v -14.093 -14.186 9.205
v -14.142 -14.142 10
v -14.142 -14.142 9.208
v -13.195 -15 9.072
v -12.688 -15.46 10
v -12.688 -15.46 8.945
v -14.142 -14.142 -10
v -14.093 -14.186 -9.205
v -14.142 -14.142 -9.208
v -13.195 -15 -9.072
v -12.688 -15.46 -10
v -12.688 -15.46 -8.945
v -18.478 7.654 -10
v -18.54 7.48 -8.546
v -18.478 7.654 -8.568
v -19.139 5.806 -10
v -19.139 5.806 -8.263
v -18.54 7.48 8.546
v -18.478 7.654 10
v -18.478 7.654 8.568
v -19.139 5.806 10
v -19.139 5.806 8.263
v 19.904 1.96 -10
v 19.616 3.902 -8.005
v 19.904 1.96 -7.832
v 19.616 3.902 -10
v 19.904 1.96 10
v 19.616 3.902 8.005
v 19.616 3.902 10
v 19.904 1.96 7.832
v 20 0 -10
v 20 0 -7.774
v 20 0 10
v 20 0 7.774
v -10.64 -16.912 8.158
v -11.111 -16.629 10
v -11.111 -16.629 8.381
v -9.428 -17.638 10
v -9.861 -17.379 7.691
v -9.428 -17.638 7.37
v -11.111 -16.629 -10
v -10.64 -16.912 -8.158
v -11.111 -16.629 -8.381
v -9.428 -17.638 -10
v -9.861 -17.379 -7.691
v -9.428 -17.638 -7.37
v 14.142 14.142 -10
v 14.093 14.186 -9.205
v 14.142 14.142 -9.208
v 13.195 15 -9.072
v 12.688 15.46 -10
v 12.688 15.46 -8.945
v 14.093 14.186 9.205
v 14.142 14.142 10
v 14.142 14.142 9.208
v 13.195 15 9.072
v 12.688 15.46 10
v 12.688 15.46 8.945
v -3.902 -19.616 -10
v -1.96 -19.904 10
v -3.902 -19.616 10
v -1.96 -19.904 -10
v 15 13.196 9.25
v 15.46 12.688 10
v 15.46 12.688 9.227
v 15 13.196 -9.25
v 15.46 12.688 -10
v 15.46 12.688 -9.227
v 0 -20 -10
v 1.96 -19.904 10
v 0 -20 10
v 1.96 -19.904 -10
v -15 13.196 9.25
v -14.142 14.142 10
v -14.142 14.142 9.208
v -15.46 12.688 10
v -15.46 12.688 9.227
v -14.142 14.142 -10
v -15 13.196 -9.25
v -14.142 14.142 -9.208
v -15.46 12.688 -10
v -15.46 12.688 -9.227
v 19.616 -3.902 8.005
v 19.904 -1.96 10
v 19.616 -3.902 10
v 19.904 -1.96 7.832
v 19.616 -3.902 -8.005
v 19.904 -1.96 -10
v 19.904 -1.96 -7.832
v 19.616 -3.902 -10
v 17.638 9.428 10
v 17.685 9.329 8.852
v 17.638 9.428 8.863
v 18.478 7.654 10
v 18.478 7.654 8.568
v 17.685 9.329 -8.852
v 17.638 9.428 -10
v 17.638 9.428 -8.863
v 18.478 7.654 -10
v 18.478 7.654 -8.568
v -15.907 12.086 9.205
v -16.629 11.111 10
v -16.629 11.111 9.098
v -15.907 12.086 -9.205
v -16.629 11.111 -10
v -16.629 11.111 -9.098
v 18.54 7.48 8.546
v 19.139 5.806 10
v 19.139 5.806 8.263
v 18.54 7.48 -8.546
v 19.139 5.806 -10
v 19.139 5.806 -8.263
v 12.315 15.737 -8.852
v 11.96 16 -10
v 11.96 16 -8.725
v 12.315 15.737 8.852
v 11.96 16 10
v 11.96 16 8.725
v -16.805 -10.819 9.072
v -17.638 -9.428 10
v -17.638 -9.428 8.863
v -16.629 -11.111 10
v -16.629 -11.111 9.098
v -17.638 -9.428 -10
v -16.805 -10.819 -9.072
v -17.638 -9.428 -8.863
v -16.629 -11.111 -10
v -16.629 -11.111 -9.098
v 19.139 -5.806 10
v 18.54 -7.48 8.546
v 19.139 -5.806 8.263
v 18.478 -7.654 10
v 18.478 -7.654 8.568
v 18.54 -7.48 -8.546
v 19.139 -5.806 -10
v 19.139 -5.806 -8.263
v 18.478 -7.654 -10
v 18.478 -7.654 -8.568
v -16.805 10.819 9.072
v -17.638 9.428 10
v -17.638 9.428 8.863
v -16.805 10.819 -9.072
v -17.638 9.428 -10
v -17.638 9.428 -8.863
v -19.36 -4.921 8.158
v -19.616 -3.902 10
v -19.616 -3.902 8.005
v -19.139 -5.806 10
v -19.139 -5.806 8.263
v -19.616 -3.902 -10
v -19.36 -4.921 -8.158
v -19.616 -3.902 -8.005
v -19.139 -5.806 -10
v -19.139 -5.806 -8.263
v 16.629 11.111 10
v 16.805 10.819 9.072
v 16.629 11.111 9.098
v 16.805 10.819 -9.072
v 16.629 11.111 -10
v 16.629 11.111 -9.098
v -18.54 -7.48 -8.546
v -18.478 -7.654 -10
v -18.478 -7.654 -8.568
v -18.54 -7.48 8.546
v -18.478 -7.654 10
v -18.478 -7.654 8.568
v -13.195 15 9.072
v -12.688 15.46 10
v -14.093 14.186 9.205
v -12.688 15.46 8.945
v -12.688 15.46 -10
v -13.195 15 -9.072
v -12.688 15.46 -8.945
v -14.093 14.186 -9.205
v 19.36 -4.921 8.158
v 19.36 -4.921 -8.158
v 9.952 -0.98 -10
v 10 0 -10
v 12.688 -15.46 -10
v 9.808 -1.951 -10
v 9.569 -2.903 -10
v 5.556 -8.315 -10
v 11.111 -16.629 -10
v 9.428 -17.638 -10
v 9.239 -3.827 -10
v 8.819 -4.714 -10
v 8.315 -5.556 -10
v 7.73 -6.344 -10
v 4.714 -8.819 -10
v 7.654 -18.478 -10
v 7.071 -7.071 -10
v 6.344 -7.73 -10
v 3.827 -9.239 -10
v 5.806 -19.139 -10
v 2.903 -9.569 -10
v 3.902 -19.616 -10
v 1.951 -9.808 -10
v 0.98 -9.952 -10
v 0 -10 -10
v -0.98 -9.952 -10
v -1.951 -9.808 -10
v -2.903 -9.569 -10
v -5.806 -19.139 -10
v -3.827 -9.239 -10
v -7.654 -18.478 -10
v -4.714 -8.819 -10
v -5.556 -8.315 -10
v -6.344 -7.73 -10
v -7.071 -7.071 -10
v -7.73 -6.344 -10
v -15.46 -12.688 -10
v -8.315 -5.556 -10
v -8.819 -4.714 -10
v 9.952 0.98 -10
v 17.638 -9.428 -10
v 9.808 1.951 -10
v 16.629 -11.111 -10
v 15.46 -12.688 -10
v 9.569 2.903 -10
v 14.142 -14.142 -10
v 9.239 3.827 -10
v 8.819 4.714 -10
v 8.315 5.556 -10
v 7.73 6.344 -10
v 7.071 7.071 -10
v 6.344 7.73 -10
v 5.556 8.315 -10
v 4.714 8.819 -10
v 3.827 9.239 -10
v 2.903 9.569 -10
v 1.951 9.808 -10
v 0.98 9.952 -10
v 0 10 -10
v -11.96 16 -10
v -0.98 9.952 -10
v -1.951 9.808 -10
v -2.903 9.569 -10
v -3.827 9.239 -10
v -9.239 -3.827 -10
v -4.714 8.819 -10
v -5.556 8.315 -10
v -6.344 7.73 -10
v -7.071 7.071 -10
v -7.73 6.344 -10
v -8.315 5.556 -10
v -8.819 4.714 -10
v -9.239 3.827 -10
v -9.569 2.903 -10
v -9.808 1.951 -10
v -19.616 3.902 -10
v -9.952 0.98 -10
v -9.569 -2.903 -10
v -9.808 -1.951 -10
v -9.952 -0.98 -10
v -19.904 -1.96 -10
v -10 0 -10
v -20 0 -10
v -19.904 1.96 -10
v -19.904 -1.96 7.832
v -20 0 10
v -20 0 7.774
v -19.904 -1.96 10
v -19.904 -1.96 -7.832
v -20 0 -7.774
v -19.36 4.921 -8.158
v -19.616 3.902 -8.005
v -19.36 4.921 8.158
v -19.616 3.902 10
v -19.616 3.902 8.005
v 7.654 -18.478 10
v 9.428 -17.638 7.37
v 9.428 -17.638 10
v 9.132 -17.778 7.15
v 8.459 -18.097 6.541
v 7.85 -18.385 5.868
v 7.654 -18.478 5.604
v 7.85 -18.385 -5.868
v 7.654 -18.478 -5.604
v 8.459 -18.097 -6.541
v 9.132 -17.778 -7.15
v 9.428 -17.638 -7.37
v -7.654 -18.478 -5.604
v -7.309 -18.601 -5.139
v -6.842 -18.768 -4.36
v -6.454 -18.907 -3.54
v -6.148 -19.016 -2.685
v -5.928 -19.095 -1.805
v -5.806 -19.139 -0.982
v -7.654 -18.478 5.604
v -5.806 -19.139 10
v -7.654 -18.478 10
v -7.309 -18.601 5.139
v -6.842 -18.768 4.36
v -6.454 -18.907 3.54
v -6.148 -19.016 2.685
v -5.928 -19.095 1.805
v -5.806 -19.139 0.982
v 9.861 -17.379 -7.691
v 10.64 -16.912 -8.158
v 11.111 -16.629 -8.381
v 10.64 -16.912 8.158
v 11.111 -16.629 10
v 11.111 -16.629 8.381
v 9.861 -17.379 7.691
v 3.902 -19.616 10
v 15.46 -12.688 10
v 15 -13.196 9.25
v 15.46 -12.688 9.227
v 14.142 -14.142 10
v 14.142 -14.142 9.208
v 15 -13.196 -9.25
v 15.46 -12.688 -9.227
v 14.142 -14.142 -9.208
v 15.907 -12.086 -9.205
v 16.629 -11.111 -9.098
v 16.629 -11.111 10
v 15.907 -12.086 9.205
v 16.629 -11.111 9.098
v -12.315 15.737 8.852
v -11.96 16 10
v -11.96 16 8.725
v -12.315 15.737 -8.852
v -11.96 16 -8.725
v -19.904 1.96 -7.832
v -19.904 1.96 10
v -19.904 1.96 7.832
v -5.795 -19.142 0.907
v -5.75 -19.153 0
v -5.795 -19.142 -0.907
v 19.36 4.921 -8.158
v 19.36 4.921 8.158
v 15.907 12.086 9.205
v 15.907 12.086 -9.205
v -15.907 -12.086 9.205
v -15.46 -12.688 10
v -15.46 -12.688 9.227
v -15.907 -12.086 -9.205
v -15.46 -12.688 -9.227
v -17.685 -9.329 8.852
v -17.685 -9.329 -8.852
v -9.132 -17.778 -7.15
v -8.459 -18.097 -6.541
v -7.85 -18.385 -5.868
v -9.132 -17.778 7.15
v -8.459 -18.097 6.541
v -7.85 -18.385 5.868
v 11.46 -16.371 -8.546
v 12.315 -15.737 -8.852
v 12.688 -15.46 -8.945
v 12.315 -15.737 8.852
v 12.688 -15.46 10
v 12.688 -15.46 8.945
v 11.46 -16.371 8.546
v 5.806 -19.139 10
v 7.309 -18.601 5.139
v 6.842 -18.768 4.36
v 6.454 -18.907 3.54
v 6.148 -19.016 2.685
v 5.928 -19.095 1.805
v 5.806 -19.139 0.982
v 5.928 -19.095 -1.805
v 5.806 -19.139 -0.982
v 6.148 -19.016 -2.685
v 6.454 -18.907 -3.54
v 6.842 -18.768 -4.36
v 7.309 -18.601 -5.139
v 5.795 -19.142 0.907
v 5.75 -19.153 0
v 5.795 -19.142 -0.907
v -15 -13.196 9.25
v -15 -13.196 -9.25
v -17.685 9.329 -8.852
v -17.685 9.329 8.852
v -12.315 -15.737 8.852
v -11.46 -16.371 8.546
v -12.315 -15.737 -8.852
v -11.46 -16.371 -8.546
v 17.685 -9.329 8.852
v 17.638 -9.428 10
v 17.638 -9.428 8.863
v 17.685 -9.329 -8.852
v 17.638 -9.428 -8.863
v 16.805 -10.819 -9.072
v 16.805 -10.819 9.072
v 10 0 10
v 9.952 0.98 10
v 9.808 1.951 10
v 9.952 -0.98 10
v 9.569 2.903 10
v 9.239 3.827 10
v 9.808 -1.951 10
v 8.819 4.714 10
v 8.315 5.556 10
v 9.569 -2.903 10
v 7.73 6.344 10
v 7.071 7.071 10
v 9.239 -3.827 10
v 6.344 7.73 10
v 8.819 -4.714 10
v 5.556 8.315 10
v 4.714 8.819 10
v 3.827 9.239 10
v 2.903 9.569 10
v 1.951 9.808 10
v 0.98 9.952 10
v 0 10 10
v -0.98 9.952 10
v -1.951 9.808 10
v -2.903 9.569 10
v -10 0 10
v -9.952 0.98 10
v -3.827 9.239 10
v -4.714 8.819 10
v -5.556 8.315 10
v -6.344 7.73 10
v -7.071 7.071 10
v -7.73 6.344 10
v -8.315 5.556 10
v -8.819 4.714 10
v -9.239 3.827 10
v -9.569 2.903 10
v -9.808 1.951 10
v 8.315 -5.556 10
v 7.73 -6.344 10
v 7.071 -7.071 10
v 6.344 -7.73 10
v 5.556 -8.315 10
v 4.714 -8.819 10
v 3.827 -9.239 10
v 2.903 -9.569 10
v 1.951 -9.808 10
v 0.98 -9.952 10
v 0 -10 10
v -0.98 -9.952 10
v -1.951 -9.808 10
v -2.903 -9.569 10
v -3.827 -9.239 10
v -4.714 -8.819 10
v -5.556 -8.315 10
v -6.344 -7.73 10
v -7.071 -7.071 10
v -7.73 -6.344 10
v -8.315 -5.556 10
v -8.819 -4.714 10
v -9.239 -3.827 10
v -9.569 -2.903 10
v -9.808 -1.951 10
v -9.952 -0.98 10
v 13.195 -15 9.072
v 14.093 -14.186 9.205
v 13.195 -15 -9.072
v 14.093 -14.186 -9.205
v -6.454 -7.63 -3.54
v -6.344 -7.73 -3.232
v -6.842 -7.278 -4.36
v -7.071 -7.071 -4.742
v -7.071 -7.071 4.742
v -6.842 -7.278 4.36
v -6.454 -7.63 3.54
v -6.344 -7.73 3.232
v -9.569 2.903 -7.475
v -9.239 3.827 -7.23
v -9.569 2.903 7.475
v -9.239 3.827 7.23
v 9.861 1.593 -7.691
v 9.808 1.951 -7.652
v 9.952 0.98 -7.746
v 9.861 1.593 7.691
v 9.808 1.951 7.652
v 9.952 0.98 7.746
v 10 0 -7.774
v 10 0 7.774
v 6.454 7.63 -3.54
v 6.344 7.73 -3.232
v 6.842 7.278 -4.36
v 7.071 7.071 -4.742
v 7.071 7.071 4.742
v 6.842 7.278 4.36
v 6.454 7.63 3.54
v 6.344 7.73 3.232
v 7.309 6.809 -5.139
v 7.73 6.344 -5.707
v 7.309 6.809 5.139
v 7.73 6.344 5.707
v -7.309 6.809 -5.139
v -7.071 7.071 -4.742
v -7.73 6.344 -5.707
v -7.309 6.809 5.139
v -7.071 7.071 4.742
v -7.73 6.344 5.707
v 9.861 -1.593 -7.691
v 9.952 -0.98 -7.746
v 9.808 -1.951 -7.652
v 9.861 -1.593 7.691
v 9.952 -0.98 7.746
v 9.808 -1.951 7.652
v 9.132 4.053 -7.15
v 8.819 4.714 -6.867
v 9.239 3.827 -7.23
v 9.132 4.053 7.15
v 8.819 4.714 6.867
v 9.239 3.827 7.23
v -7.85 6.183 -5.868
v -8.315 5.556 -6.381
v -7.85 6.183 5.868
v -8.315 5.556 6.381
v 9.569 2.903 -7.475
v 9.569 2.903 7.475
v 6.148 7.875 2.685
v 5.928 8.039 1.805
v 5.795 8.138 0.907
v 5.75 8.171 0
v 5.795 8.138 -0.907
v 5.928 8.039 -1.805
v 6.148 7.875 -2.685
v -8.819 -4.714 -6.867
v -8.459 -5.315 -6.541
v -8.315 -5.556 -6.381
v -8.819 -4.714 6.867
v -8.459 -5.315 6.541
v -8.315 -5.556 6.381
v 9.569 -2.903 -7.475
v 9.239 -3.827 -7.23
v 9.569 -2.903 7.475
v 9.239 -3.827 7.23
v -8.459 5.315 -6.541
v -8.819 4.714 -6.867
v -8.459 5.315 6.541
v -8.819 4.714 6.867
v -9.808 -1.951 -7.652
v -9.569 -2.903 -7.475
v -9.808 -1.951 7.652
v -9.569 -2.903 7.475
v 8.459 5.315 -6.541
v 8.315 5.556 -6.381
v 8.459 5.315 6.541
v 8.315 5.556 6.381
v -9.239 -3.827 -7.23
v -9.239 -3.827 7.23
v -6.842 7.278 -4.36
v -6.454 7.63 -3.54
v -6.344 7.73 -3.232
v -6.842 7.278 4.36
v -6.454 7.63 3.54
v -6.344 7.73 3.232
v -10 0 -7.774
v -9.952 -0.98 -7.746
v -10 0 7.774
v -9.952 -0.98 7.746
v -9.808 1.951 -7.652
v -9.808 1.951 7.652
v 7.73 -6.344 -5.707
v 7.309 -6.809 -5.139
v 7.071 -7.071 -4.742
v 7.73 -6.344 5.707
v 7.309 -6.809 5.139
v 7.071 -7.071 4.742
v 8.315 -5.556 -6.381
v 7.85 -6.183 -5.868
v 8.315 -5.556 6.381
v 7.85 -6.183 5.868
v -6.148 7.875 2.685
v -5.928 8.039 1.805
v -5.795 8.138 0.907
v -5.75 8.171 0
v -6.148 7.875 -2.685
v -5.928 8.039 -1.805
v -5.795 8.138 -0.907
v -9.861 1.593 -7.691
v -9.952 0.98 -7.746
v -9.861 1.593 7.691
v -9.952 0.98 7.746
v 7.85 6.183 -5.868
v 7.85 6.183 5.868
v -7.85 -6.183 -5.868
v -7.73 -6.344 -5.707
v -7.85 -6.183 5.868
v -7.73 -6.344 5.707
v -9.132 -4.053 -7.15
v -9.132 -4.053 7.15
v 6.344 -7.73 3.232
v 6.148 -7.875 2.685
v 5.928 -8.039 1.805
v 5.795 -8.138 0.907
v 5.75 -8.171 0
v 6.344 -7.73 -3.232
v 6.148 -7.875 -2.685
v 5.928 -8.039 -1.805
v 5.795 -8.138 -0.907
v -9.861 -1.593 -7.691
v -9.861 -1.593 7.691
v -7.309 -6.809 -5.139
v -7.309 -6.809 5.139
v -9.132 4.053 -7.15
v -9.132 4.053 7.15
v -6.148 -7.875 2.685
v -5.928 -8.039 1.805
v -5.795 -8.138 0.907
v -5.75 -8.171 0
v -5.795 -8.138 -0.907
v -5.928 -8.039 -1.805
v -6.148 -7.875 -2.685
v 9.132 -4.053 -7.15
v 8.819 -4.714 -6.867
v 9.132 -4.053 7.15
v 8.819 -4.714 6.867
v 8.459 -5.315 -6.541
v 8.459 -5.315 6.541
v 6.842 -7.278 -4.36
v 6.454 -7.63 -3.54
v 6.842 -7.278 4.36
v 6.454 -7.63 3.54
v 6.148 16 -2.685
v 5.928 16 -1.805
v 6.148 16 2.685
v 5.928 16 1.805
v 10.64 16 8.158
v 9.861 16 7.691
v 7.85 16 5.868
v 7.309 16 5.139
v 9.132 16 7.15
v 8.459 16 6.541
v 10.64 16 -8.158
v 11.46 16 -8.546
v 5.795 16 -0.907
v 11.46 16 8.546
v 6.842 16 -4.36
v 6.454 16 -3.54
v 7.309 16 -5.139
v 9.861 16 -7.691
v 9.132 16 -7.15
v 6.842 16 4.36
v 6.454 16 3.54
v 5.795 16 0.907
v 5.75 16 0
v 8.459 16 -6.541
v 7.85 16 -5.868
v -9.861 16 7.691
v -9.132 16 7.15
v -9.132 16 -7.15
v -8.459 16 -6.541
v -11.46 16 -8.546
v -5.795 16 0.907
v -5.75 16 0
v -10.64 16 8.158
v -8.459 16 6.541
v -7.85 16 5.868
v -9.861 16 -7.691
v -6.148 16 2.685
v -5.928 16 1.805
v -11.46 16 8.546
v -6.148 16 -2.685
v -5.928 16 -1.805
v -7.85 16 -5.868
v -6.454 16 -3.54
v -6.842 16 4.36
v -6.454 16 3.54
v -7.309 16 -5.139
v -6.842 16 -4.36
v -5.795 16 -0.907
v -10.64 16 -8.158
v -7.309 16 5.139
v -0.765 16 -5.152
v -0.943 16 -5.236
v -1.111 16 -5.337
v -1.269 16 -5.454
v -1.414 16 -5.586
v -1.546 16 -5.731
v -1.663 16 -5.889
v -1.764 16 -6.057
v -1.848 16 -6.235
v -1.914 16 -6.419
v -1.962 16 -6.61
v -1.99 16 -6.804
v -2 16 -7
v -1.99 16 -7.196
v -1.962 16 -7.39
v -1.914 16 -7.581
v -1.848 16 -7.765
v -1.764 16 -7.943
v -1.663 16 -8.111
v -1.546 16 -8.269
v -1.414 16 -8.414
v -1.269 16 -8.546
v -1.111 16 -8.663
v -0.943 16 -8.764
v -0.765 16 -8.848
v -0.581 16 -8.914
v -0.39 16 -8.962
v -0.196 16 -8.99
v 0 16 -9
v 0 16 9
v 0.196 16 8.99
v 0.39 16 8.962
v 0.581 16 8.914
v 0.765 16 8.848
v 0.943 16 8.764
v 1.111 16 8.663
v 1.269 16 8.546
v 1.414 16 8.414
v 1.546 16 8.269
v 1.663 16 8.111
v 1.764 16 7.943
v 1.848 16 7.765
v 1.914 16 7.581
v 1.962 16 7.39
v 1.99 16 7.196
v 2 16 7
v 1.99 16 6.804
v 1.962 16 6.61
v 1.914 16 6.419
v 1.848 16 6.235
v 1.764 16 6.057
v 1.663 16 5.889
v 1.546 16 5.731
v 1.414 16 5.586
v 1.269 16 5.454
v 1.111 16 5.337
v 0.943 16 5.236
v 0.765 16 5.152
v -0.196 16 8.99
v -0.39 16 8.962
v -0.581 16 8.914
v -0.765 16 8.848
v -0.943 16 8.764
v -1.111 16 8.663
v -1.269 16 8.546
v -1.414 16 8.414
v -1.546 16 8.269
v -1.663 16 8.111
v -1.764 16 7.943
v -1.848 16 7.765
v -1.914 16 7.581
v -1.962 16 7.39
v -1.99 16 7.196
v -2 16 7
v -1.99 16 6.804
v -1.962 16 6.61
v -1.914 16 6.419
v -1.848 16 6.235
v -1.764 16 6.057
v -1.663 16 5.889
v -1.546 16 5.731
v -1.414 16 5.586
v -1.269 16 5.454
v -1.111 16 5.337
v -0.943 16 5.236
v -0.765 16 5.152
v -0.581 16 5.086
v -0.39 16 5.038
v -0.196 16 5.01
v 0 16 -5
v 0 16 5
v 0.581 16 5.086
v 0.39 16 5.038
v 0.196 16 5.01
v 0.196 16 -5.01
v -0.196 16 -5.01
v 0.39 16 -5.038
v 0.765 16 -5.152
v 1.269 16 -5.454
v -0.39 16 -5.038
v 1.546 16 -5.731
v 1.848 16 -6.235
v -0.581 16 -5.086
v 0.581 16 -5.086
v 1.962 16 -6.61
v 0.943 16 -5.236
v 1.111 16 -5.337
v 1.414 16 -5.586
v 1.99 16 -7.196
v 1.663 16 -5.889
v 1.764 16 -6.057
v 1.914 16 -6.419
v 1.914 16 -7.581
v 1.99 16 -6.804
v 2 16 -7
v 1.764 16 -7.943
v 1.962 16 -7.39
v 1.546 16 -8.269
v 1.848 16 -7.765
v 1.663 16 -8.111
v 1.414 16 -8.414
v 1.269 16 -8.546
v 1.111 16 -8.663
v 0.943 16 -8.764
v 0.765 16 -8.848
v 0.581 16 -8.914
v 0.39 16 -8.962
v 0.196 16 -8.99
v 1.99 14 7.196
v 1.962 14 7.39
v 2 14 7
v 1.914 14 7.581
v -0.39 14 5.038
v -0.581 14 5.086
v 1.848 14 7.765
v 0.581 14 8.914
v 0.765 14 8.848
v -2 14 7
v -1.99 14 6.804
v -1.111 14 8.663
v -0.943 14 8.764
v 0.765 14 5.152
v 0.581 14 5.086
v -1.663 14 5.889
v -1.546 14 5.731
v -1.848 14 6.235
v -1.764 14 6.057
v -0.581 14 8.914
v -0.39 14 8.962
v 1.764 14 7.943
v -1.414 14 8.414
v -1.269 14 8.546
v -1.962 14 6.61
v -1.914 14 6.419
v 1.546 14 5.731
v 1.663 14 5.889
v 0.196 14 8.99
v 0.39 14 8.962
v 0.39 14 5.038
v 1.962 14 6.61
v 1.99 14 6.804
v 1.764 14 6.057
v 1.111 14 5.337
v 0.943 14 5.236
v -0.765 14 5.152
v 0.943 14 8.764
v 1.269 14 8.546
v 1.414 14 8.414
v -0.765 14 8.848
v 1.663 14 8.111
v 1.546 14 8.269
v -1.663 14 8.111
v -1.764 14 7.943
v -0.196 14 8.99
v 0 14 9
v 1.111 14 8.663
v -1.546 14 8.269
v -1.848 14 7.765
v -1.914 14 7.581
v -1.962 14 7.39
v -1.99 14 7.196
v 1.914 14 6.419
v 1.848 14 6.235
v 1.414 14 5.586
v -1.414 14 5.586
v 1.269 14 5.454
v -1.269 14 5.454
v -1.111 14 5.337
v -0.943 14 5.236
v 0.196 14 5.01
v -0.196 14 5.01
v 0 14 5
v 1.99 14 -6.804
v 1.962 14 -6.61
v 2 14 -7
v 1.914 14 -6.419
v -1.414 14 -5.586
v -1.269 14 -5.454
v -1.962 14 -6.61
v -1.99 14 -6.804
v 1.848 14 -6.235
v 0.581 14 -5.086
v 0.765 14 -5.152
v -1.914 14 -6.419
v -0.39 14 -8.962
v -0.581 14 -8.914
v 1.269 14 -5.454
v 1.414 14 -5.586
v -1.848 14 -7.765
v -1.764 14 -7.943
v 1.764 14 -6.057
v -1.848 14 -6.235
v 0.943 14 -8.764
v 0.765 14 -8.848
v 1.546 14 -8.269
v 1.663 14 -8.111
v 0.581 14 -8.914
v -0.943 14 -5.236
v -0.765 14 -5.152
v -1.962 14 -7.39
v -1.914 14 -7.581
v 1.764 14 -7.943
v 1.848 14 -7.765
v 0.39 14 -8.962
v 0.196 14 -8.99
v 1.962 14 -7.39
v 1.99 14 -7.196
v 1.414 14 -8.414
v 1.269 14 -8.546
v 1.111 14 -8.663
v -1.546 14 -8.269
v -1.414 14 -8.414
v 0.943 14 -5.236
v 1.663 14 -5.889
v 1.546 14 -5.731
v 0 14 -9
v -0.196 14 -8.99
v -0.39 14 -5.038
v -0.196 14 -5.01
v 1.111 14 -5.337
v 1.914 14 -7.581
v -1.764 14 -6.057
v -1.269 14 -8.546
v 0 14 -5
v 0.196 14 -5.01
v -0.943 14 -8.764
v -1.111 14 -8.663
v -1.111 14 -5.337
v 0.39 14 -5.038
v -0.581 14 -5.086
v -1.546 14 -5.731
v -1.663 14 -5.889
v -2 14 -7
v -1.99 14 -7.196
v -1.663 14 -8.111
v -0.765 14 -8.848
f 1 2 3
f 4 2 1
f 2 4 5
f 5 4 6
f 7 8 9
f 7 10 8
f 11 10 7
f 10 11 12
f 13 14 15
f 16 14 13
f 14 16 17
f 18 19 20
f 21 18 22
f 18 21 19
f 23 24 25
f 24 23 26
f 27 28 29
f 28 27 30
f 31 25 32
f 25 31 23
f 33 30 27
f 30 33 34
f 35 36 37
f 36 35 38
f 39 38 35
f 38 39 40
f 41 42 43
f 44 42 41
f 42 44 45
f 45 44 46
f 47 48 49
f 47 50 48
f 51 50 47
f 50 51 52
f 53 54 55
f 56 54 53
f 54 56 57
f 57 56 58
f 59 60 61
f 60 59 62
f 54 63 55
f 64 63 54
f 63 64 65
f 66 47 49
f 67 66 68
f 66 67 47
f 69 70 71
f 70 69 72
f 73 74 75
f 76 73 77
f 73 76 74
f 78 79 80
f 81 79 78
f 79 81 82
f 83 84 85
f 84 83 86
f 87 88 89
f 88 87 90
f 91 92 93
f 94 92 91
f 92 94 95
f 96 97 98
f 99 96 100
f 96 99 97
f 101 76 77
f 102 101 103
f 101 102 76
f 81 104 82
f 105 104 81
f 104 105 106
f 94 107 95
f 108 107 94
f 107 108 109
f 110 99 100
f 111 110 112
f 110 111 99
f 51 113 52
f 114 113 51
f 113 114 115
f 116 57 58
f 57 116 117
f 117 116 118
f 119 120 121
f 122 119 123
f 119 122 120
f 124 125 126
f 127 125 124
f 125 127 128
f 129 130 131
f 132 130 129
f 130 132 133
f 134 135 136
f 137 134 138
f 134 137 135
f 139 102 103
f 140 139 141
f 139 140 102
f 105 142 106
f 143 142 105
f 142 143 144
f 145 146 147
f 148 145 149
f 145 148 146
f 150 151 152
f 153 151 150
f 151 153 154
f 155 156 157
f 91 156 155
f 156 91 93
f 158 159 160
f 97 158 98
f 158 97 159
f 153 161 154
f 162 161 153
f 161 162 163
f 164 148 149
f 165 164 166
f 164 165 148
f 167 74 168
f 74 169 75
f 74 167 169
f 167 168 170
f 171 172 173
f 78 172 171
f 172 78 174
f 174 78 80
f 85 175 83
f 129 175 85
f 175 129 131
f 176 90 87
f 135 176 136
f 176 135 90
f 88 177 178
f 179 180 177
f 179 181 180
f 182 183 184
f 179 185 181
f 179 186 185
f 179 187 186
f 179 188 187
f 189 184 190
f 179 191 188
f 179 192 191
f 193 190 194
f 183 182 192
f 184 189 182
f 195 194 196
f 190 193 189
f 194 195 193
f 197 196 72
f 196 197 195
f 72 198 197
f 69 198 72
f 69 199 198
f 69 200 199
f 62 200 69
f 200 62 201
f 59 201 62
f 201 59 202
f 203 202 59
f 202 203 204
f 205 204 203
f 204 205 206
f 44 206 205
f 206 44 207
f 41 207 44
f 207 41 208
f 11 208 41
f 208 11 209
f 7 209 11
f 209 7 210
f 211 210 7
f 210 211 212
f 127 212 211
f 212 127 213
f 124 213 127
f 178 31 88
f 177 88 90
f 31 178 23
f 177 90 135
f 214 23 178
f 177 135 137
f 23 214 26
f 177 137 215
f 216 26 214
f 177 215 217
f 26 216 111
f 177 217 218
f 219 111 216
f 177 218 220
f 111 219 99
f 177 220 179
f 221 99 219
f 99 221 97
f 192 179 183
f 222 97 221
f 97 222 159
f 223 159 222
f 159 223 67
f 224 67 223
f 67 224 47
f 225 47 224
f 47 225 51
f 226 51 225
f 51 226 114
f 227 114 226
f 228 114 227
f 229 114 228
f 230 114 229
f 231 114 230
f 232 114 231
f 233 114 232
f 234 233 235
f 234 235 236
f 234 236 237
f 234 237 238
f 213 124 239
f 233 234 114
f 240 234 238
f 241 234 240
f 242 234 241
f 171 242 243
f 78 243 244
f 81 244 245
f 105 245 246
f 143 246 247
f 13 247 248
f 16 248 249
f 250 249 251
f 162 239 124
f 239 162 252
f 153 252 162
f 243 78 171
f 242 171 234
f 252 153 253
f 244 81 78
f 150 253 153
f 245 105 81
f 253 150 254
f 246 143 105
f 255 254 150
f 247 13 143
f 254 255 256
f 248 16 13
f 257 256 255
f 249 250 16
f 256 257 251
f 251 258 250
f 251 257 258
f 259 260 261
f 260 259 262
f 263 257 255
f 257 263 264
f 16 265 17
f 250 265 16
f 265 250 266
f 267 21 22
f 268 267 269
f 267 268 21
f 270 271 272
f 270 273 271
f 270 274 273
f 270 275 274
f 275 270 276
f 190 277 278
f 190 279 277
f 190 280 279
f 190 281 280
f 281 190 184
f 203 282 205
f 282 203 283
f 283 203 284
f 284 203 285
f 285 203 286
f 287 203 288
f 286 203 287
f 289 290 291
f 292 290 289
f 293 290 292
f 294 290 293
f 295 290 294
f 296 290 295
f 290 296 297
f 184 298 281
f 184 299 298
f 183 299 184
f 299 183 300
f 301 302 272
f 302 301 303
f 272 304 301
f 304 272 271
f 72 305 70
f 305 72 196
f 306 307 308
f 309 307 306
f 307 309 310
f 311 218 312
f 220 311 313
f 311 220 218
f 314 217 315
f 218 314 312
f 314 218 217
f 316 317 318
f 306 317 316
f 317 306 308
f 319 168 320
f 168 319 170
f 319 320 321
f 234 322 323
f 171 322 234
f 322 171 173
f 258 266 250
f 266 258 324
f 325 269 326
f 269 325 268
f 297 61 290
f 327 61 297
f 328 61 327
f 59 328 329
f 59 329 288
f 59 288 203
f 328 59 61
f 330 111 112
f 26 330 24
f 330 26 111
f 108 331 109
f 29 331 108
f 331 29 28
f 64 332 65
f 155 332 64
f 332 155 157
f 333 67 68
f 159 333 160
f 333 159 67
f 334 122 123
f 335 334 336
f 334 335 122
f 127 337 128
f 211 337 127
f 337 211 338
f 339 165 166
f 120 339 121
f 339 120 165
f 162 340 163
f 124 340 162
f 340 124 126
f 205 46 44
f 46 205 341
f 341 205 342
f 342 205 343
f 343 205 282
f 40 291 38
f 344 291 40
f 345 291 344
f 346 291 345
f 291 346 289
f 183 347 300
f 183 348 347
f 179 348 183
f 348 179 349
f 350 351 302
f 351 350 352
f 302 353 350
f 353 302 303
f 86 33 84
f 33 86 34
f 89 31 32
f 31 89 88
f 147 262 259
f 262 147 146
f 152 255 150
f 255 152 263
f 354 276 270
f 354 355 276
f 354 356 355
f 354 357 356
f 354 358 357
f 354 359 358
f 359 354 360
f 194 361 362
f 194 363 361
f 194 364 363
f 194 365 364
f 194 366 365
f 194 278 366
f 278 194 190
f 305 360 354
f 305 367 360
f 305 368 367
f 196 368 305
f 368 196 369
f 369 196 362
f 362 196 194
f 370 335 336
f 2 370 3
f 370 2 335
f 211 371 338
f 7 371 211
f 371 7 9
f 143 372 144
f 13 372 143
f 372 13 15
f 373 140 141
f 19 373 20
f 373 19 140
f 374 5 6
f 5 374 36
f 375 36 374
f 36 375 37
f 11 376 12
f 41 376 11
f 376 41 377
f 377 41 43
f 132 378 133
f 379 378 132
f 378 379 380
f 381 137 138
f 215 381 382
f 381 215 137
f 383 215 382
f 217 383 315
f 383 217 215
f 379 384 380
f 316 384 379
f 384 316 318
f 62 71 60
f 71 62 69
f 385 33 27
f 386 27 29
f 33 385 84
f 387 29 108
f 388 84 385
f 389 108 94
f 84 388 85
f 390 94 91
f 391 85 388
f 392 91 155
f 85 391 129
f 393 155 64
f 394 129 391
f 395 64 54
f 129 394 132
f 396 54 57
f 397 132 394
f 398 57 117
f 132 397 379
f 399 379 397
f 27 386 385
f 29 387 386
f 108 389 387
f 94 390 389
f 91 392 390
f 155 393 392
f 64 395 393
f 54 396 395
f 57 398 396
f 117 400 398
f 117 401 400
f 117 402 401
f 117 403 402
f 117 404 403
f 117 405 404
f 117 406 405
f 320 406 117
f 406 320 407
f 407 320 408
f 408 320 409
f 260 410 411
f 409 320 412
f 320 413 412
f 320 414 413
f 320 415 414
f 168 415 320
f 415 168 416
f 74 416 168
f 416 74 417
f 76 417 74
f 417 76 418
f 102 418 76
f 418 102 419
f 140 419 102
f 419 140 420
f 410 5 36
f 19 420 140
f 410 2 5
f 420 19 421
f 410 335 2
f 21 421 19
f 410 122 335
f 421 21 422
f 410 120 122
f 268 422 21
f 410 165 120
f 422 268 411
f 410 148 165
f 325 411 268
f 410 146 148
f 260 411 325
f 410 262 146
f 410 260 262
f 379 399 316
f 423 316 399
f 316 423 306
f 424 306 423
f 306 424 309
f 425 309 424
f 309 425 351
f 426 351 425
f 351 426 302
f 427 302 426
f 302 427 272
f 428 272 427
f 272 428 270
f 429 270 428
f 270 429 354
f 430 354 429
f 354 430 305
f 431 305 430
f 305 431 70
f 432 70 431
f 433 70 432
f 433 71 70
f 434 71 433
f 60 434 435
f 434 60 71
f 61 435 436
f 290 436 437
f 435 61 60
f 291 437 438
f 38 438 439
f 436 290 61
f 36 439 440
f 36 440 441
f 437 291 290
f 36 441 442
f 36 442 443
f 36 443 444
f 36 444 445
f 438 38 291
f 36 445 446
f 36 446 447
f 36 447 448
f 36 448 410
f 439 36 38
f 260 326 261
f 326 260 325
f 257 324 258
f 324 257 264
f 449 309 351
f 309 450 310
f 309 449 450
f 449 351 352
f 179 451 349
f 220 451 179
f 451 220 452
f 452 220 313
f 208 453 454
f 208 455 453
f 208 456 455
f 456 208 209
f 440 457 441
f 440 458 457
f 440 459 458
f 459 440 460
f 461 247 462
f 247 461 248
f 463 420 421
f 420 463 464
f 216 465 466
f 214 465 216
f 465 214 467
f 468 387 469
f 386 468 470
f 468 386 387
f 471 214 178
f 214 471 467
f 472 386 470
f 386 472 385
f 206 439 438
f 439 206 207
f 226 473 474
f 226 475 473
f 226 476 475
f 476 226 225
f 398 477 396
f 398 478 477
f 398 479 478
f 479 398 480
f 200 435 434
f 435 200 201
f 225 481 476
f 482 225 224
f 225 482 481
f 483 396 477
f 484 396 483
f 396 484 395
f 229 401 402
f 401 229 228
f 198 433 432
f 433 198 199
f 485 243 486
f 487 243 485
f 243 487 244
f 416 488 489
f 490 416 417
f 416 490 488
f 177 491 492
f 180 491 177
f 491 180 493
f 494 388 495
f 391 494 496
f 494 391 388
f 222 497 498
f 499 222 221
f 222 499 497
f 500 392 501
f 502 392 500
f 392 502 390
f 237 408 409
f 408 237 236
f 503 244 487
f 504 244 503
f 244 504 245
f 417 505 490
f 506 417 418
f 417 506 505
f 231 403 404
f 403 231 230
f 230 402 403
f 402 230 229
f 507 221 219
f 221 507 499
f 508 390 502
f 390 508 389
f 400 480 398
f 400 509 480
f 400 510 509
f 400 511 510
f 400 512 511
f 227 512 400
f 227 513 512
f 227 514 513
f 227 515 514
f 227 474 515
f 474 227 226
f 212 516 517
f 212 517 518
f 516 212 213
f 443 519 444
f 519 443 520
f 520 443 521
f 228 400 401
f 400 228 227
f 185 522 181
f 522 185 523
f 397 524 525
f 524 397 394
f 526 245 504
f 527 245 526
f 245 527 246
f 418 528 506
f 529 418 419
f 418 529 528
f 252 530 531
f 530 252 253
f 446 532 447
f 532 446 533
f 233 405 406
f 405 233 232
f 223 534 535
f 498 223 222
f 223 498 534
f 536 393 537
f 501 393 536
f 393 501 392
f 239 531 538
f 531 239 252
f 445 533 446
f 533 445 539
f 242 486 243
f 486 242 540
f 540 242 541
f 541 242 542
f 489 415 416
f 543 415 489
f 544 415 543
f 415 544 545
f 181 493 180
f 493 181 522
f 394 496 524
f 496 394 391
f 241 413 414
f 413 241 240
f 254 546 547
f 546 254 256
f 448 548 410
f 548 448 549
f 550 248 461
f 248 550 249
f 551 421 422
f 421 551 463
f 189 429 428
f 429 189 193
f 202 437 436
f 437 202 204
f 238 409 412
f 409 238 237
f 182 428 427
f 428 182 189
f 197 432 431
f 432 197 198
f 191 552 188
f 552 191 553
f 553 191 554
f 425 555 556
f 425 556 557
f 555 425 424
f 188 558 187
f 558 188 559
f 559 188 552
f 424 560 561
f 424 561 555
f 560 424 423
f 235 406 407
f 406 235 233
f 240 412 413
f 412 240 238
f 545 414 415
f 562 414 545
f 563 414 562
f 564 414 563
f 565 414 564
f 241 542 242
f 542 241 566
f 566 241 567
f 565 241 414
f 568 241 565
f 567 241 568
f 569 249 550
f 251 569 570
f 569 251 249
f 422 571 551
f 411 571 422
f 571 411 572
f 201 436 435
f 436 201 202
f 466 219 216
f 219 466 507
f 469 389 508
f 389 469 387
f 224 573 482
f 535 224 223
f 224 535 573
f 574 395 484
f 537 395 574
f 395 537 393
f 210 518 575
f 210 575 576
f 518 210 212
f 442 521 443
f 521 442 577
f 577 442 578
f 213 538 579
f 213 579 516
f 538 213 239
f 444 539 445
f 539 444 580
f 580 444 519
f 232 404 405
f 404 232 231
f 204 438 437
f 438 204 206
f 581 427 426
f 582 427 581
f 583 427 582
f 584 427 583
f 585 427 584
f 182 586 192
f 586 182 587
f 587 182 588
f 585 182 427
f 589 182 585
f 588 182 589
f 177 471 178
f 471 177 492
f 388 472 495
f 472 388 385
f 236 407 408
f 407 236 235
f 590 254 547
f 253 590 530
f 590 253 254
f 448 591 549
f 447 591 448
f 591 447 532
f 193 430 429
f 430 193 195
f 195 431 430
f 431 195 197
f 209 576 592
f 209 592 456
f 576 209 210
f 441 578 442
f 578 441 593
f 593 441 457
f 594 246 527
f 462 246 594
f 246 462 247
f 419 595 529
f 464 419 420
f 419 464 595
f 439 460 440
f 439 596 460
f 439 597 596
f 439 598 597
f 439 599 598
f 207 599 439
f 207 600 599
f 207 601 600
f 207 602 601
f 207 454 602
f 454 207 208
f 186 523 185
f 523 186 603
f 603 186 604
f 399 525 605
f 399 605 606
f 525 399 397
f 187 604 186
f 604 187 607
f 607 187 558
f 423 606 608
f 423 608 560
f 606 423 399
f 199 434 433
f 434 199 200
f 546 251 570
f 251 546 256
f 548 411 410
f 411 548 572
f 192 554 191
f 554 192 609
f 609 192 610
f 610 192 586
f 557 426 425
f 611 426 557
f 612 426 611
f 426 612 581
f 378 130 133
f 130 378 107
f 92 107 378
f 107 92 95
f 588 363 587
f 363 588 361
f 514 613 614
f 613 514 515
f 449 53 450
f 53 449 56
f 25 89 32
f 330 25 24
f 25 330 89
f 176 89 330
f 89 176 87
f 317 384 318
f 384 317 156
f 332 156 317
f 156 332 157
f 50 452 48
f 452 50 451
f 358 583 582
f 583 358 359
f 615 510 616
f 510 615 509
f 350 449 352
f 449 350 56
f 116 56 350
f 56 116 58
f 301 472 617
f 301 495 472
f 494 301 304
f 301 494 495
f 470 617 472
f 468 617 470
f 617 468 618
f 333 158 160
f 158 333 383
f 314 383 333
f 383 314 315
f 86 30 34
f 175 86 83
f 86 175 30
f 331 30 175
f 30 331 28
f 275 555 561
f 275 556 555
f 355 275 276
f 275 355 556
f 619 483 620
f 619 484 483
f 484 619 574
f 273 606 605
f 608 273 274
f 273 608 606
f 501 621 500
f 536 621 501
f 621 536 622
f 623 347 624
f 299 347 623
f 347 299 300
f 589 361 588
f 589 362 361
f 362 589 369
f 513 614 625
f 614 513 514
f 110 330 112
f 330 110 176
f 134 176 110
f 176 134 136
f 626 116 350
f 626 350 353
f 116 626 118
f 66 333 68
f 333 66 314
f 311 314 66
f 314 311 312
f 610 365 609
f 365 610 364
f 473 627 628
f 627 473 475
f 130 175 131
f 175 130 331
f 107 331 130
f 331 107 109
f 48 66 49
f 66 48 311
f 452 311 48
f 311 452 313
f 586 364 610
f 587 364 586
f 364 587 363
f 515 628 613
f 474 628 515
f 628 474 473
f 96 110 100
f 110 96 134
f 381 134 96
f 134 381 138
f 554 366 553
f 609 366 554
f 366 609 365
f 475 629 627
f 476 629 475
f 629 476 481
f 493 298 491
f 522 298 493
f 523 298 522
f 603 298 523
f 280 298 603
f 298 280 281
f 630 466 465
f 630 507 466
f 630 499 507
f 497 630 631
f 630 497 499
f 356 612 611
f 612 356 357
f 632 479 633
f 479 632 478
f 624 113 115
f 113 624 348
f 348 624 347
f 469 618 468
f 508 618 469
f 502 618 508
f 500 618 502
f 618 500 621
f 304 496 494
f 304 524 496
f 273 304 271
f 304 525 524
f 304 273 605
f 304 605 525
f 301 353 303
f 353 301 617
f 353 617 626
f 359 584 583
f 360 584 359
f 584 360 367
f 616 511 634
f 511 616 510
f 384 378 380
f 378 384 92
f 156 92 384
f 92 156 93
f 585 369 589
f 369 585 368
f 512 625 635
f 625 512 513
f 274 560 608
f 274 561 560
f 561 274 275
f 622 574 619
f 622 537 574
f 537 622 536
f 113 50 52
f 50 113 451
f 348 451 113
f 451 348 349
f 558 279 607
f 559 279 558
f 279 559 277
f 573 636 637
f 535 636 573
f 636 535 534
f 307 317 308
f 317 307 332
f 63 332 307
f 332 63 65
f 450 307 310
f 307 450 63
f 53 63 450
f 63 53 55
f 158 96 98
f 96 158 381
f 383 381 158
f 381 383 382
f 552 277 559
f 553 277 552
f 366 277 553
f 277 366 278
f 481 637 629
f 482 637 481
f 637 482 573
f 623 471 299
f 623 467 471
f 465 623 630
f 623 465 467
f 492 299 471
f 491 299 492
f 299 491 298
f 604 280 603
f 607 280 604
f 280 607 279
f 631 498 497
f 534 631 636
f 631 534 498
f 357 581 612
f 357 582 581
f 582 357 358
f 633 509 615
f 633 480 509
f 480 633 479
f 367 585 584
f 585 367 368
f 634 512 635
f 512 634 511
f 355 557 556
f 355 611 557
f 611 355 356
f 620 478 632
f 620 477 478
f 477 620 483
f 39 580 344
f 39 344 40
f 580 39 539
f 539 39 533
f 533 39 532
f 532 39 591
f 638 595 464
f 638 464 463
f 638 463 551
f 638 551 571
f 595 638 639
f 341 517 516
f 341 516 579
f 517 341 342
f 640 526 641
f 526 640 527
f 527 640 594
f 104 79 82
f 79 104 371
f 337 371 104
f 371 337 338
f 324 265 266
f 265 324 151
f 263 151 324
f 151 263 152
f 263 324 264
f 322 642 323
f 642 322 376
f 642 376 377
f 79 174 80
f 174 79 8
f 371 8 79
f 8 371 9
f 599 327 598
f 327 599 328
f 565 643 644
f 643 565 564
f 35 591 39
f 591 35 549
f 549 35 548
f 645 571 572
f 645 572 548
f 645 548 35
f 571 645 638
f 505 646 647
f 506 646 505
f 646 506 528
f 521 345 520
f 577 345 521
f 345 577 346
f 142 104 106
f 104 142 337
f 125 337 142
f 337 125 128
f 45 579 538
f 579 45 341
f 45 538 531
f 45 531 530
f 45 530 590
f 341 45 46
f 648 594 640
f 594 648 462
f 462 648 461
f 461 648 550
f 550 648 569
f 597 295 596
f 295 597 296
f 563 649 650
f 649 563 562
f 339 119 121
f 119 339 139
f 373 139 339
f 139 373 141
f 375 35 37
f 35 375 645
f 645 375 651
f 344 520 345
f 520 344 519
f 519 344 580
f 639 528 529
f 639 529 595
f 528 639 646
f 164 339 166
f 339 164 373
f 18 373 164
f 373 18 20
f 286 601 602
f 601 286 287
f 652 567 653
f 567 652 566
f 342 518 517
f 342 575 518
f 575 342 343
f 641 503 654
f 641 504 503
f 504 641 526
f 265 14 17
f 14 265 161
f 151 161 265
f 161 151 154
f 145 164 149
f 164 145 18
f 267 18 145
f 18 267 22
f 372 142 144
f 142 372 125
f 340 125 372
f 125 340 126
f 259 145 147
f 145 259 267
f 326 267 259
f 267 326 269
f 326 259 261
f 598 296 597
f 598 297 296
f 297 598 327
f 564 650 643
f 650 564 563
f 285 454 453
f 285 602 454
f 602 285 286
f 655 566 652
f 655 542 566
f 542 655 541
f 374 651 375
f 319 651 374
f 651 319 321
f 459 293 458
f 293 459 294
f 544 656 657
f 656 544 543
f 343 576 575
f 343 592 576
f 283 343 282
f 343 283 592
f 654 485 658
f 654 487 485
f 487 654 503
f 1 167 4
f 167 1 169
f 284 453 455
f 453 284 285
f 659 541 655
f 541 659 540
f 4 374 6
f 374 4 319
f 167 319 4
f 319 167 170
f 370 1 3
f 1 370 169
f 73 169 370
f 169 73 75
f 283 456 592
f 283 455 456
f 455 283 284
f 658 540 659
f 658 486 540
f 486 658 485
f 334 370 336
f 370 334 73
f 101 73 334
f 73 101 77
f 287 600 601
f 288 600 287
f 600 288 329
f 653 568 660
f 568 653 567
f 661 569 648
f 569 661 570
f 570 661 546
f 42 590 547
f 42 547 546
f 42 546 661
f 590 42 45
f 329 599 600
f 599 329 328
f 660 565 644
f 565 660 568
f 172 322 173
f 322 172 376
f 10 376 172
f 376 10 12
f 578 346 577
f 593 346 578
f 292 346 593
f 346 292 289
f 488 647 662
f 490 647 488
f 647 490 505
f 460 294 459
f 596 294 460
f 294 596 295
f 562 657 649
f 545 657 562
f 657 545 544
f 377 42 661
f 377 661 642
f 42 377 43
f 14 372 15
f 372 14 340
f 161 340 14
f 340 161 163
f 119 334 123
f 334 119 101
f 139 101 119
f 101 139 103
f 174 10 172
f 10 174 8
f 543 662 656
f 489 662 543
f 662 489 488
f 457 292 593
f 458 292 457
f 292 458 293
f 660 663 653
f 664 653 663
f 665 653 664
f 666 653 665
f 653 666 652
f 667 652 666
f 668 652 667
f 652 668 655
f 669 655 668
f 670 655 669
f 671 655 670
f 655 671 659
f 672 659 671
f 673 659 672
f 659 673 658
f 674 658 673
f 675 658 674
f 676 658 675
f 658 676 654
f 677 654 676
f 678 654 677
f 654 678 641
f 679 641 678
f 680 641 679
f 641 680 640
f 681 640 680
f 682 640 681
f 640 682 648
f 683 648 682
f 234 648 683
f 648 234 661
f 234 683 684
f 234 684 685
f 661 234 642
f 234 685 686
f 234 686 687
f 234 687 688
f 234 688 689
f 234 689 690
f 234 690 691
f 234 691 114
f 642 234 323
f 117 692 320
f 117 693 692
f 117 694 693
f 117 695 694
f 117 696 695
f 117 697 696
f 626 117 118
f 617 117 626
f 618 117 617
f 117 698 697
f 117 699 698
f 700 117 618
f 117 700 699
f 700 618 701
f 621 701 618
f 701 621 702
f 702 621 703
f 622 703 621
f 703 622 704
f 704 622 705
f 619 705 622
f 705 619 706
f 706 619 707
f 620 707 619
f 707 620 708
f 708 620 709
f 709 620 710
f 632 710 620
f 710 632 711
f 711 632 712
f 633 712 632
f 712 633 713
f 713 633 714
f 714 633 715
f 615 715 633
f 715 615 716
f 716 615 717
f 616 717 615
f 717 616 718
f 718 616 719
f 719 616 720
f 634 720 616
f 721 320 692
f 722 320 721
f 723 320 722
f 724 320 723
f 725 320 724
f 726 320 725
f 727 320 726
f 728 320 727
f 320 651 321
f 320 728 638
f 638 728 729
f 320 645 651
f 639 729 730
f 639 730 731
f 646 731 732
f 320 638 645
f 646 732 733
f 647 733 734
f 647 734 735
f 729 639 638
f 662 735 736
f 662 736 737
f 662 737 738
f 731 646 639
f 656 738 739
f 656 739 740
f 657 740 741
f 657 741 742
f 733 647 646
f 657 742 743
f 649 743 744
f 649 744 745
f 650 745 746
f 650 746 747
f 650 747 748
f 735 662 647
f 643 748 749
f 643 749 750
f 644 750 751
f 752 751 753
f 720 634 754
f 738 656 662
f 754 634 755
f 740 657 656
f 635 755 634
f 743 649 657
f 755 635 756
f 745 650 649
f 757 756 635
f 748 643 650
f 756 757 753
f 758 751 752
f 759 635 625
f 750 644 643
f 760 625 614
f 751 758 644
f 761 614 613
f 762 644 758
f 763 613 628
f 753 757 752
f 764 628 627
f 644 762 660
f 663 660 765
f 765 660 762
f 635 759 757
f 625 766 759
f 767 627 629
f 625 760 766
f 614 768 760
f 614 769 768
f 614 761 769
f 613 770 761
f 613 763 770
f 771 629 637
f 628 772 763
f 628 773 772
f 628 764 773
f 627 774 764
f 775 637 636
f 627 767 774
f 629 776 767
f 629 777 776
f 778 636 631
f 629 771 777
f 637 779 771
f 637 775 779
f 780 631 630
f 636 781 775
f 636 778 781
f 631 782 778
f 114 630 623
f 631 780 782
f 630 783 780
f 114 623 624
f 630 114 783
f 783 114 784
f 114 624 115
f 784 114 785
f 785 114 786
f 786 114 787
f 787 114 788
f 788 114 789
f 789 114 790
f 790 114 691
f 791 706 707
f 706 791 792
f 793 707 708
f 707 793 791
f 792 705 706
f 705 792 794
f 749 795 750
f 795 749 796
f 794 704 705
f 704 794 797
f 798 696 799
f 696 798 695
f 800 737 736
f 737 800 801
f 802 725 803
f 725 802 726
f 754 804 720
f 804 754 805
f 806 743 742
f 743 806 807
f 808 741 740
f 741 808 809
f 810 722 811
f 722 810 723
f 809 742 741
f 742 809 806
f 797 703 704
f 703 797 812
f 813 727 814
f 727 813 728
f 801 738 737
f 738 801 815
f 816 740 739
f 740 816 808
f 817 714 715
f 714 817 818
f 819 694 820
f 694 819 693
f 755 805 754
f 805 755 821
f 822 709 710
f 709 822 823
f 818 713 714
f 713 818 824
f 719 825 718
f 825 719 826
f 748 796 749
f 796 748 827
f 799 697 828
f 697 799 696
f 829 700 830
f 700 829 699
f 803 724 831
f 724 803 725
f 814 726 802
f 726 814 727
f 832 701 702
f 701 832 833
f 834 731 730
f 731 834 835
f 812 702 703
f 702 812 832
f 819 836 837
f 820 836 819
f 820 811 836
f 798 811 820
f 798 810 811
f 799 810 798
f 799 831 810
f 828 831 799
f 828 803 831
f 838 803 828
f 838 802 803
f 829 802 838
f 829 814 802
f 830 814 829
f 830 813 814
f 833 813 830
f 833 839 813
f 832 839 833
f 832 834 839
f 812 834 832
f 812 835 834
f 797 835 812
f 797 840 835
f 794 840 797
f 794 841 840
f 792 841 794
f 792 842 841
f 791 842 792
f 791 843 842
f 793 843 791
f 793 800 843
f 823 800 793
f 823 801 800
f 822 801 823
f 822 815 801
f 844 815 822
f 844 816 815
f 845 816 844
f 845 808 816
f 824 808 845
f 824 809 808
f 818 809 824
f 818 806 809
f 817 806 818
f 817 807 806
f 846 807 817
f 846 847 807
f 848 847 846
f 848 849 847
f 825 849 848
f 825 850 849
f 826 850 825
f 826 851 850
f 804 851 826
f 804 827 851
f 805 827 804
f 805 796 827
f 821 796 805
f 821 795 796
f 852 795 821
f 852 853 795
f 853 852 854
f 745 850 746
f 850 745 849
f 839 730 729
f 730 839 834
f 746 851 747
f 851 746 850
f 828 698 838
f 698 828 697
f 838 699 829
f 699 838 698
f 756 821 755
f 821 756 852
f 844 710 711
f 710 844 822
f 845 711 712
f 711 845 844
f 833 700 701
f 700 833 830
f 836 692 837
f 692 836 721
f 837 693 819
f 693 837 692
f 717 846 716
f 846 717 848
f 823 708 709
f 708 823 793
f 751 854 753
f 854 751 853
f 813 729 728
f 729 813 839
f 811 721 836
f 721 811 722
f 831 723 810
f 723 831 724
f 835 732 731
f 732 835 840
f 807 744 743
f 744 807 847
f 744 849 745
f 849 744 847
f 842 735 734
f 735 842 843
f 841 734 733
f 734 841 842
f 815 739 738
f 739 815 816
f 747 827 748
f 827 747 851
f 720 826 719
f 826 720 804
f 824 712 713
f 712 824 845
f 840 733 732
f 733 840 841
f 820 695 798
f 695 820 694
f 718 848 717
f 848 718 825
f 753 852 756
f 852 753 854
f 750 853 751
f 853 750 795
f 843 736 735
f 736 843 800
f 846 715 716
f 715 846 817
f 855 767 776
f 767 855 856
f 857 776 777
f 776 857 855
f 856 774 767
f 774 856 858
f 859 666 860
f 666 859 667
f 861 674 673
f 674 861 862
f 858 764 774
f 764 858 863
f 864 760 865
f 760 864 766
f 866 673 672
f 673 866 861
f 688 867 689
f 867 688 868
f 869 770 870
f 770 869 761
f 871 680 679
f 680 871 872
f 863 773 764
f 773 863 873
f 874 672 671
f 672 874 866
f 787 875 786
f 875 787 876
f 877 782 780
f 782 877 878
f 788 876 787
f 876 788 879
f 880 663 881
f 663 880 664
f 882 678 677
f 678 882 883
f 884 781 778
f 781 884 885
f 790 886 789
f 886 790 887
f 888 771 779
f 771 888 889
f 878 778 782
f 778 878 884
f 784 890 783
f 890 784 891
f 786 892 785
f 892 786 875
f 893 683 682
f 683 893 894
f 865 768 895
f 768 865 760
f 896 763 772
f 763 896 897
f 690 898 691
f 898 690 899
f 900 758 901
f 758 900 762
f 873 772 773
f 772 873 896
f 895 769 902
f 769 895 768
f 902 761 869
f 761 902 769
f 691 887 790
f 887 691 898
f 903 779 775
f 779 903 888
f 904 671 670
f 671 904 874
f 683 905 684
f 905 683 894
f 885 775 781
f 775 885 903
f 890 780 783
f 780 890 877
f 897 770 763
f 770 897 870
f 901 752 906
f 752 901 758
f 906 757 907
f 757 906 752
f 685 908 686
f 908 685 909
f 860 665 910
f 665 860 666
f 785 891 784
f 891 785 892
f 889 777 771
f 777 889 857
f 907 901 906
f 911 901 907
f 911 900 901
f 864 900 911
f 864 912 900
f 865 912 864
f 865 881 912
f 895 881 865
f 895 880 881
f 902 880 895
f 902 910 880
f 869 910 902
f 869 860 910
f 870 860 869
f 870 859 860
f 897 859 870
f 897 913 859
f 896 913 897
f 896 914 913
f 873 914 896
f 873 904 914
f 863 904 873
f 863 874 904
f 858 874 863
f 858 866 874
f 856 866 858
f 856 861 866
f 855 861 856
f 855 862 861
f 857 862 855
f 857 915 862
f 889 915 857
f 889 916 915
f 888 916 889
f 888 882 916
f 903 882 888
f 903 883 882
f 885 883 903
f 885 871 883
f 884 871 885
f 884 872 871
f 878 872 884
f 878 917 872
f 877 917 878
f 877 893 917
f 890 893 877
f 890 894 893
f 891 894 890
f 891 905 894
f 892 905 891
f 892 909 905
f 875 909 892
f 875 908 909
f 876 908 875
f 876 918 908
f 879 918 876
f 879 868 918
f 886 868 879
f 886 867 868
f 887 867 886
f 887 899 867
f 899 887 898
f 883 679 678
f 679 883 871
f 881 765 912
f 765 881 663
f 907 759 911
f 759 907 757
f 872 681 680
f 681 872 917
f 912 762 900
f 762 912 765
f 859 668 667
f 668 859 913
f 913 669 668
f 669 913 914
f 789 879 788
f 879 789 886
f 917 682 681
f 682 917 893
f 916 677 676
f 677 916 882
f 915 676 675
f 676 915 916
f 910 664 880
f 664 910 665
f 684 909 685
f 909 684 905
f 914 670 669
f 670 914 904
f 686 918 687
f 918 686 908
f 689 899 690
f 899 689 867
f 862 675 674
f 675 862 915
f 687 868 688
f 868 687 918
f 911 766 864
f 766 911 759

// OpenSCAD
// COBRA Vertebra - T1 V7
// Height: 20.0mm, OD: 40.0mm

$fn = 64;

difference() {
    // Outer cylinder
    cylinder(h=20.0, d=40.0, center=true);
    
    // Inner channel
    cylinder(h=22.0, d=20.0, center=true);

    // Battery cavity 1
    rotate([0, 0, 0])
    translate([15.0, 0, 0])
    rotate([90, 0, 0])
    cylinder(h=74.0, d=18.5, center=true);

    // Battery cavity 2
    rotate([0, 0, 180])
    translate([15.0, 0, 0])
    rotate([90, 0, 0])
    cylinder(h=74.0, d=18.5, center=true);

    // Solar panel cavity
    translate([0, 18.0, 0])
    cube([50, 4, 30], center=true);

    // Pivot holes
    translate([0, 20.0, 7.0])
    rotate([90, 0, 0])
    cylinder(h=12.0, d=4, center=true);
    
    translate([0, 20.0, -7.0])
    rotate([90, 0, 0])
    cylinder(h=12.0, d=4, center=true);
}
